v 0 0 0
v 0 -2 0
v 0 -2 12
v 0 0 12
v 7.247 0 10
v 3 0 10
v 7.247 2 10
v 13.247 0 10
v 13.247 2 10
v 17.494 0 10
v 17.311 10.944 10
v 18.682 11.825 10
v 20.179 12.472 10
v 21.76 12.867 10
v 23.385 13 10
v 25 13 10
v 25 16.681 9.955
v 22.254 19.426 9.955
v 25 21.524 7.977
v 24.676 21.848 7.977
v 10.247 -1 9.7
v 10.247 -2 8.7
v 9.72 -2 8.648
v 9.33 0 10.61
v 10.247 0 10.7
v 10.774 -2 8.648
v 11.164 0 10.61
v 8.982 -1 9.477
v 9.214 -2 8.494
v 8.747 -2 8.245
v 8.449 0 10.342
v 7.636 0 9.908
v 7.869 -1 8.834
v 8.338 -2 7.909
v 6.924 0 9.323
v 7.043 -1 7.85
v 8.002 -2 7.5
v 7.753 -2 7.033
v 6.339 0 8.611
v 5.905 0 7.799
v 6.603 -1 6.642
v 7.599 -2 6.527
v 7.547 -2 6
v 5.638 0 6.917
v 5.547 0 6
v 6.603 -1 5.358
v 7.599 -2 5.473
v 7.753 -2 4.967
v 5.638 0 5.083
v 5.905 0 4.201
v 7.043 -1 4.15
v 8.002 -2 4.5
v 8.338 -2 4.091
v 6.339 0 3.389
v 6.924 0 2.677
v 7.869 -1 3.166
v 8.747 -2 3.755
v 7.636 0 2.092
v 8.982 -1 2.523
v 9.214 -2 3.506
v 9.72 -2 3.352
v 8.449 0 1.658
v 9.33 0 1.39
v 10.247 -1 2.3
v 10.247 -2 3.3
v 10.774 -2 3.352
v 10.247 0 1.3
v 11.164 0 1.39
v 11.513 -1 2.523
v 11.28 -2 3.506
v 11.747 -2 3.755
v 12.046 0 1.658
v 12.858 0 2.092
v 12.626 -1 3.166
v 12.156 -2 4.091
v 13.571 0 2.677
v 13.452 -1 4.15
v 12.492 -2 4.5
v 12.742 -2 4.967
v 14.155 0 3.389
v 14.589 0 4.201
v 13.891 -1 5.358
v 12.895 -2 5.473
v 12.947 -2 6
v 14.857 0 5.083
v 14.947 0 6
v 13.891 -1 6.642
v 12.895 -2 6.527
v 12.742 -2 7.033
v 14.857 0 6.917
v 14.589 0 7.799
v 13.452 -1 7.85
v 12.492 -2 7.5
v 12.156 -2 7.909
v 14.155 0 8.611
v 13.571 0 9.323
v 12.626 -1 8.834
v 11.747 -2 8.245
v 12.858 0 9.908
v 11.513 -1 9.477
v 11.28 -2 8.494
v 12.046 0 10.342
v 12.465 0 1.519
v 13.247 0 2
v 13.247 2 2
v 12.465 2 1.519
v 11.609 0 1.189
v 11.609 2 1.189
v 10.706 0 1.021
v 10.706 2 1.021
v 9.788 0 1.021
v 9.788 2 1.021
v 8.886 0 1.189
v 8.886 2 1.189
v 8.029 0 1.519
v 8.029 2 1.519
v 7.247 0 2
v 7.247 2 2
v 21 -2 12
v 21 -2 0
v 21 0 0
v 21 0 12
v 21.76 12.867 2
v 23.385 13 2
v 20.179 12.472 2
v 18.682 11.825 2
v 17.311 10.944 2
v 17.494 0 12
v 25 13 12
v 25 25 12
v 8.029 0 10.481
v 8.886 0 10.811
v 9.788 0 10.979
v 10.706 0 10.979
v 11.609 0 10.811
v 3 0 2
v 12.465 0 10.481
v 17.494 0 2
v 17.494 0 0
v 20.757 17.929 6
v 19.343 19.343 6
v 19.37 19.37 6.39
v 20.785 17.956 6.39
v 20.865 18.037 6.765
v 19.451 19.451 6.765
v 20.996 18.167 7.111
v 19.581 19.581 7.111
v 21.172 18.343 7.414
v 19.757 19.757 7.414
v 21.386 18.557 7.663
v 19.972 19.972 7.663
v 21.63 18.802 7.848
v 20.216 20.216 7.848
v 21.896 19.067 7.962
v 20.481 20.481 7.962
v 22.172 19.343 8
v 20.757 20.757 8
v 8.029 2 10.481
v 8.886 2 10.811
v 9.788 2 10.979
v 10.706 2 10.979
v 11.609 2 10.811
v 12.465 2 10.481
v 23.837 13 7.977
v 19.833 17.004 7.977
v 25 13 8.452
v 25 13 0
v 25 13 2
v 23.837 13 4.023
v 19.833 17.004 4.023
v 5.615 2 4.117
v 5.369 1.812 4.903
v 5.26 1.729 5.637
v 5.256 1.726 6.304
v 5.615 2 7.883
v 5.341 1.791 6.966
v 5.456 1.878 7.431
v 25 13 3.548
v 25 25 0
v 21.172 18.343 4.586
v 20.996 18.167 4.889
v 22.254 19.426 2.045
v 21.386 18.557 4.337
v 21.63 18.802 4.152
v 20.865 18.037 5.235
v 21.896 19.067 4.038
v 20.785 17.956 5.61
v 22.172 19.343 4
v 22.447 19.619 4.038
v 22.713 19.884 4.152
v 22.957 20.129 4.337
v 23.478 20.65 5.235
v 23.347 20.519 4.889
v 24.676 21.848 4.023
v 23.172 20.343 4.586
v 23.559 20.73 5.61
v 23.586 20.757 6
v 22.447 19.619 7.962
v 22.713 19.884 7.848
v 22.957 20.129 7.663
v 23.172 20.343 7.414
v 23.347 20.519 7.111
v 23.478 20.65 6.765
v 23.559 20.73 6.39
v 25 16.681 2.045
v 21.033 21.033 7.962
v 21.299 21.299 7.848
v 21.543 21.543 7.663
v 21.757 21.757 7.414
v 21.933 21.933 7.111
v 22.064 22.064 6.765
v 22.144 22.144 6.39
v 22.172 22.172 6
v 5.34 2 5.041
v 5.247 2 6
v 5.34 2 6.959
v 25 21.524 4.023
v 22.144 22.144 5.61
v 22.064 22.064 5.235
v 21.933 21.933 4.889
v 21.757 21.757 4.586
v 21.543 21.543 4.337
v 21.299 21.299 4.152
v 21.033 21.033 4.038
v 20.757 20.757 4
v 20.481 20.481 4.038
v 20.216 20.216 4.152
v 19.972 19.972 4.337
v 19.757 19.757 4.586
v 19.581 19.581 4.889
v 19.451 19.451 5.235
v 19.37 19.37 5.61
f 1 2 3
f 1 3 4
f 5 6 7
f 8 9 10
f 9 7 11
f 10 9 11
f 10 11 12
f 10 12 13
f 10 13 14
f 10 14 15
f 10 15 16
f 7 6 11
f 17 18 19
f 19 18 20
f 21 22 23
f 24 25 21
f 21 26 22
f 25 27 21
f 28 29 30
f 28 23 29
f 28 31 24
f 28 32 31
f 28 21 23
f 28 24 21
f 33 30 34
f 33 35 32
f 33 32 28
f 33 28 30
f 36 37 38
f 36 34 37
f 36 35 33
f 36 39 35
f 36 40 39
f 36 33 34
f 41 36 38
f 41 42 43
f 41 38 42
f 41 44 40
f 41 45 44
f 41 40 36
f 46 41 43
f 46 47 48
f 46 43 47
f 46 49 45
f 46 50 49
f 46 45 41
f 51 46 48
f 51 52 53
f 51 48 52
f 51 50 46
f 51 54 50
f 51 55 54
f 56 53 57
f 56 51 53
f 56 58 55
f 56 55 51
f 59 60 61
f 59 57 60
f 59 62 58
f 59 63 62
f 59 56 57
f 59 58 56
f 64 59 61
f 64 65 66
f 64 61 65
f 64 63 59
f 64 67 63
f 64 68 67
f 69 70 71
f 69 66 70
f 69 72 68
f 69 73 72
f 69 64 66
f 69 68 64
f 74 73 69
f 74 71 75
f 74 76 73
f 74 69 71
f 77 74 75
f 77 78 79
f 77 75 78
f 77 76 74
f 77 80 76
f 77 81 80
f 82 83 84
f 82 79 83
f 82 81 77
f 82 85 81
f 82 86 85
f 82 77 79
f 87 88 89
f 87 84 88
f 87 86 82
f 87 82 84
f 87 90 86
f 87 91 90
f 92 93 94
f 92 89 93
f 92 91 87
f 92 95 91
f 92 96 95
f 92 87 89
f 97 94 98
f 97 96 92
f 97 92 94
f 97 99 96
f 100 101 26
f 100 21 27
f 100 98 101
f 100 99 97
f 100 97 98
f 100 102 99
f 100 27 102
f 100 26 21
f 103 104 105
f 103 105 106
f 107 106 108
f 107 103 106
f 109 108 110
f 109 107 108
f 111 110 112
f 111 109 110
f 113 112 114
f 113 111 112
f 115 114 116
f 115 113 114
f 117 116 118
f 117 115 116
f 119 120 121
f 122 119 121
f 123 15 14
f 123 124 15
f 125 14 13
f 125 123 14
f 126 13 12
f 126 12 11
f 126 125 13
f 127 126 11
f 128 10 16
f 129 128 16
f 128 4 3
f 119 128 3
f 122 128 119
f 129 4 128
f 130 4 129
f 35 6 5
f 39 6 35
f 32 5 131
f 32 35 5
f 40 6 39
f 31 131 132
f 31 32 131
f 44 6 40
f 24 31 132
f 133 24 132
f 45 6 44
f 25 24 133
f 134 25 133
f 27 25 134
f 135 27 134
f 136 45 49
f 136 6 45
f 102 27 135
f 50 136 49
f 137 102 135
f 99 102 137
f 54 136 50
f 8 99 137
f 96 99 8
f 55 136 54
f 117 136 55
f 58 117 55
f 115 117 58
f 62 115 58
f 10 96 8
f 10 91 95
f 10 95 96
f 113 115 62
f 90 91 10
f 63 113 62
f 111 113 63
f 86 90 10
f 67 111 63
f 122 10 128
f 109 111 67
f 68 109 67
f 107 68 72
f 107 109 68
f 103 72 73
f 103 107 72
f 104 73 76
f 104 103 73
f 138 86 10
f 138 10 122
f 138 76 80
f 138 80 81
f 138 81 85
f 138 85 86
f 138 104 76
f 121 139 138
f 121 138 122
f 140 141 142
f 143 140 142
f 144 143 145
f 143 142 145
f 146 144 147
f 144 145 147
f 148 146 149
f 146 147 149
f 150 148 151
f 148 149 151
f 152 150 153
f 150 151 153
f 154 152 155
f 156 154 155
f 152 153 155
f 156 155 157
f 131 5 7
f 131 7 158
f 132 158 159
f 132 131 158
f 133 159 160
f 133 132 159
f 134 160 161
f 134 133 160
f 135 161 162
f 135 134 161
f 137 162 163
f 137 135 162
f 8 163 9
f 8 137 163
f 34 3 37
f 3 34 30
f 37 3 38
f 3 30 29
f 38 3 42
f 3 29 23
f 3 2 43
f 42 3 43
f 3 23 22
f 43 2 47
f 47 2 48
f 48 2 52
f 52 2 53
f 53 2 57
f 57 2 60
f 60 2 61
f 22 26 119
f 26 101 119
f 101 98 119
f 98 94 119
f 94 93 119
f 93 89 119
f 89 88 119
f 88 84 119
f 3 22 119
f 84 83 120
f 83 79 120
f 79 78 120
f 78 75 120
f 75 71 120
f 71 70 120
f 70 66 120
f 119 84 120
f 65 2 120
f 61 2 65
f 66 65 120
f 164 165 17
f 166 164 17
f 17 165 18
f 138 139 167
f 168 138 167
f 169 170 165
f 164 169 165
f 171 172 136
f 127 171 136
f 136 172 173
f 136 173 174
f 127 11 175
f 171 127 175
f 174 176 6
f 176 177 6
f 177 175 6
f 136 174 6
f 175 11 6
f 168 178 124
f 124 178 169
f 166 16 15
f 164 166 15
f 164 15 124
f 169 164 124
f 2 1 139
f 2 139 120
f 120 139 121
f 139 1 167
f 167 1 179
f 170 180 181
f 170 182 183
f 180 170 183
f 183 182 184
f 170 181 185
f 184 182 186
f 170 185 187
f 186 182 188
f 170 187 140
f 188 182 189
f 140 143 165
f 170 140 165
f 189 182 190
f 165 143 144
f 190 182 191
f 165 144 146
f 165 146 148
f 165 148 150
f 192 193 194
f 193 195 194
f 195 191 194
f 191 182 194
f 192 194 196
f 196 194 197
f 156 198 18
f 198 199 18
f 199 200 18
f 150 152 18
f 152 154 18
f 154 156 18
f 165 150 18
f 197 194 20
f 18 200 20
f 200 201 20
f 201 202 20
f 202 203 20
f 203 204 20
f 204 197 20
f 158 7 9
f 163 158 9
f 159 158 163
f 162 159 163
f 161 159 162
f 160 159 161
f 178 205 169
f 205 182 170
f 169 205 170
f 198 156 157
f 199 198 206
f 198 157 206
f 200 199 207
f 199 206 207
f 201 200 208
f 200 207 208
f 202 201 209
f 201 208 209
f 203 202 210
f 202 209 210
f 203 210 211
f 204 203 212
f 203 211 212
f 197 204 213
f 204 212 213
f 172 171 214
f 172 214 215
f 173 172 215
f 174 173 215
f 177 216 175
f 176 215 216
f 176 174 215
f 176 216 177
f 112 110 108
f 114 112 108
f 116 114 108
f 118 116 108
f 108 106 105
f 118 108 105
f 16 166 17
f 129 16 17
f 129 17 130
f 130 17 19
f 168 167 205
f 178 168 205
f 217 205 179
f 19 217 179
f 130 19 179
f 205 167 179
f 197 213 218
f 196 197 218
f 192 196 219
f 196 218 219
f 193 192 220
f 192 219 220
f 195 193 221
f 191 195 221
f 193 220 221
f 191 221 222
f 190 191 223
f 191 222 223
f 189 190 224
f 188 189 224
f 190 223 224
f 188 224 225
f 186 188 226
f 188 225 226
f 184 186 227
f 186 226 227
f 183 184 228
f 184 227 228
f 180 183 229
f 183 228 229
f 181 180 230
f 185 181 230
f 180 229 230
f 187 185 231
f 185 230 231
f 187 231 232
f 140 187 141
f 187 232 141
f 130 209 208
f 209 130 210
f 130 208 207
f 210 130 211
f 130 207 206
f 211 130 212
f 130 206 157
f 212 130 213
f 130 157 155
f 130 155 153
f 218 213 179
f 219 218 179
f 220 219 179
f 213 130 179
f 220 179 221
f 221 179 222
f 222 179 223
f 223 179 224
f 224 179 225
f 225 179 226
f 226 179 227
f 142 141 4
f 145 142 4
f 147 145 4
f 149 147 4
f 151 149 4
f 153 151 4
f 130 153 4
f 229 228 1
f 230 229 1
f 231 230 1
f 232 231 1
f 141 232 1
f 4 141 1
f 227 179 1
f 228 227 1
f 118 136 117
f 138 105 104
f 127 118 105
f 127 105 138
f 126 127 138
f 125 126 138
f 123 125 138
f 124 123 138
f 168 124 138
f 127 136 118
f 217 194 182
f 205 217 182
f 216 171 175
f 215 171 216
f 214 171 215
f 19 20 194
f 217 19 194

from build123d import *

# Parameters (mm, degrees)
SKETCH3_W           = 21
SKETCH3_H           = 2
BOSS_EXTRUDE1_DEPTH = 12
CUT_EXTRUDE1_START  = -2
CUT_EXTRUDE1_DEPTH  = 8
CUT_EXTRUDE8_START  = -2
CUT_EXTRUDE8_DEPTH  = 36.336309405
CUT_EXTRUDE9_DEPTH  = 38.336309405
CUT_EXTRUDE11_DEPTH = 2
FILLET1_R           = 10


with BuildPart() as part:
    # Sketch3 → Boss-Extrude1 (new body)
    with BuildSketch(Plane.XY):
        with Locations((10.5, -1)):
            Rectangle(SKETCH3_W, SKETCH3_H)
        Polygon((13, 13), (0, 0), (17.494446501, 0), (25, 13), align=None)
        Polygon((25, 25), (13, 13), (25, 13), align=None)
    extrude(amount=BOSS_EXTRUDE1_DEPTH)

    # Sketch4 → Cut-Extrude1 (cut)
    with BuildSketch(Plane.XY.offset(12).offset(CUT_EXTRUDE1_START)):
        Polygon((25, 13), (20, 13), (3, 0), (17.494446501, 0), align=None)
    extrude(amount=-CUT_EXTRUDE1_DEPTH, mode=Mode.SUBTRACT)

    # Sketch7 → Cut-Extrude8 (cut, through all)
    with BuildSketch(Plane(origin=(0, 0, 0), x_dir=(0, 0, 1), z_dir=(-0.7071067811865485, 0.7071067811865466, 0)).offset(CUT_EXTRUDE8_START)):
        Polygon((6, 26.047596513), (6, 32.897596513), (4.022575328, 32.897596513), (2.045150656, 29.472596513), (4.022575328, 26.047596513), align=None)
        Polygon((7.977424672, 32.897596513), (6, 32.897596513), (6, 26.047596513), (7.977424672, 26.047596513), (9.954849344, 29.472596513), align=None)
    extrude(amount=-CUT_EXTRUDE8_DEPTH, mode=Mode.SUBTRACT)

    # Sketch8 → Cut-Extrude9 (cut, through all)
    with BuildSketch(Plane(origin=(0, 0, 0), x_dir=(0, 0, 1), z_dir=(-0.7071067811865485, 0.7071067811865466, 0))):
        with BuildLine():
            ThreePointArc((8, 29.355339059), (7.414213562, 30.769552622), (6, 31.355339059))
            Line((6, 31.355339059), (6, 27.355339059))
            ThreePointArc((6, 27.355339059), (7.414213562, 27.941125497), (8, 29.355339059))
        make_face()
        with BuildLine():
            Line((6, 27.355339059), (6, 31.355339059))
            ThreePointArc((6, 31.355339059), (4, 29.355339059), (6, 27.355339059))
        make_face()
    extrude(amount=-CUT_EXTRUDE9_DEPTH, mode=Mode.SUBTRACT)

    # Sketch9 → Cut-Extrude11 (cut)
    with BuildSketch(Plane(origin=(0, 0, 0), x_dir=(1, 0, 0), z_dir=(0, 1, 0))):
        with BuildLine():
            ThreePointArc((7.24722325, -2), (5.358620419, -4.950446591), (5.869726291, -8.416096101))
            Line((5.869726291, -8.416096101), (8.496224466, -6.96643844))
            ThreePointArc((8.496224466, -6.96643844), (9.28078481, -4.249001216), (11.998222034, -5.03356156))
            Line((11.998222034, -5.03356156), (14.62472021, -3.583903899))
            ThreePointArc((14.62472021, -3.583903899), (14.020027676, -2.718849781), (13.24722325, -2))
            Line((13.24722325, -2), (7.24722325, -2))
        make_face()
        with BuildLine():
            Line((8.496224466, -6.96643844), (5.869726291, -8.416096101))
            ThreePointArc((5.869726291, -8.416096101), (6.474418824, -9.281150219), (7.24722325, -10))
            Line((7.24722325, -10), (13.24722325, -10))
            ThreePointArc((13.24722325, -10), (14.719359205, -8.236067977), (15.24722325, -6))
            ThreePointArc((15.24722325, -6), (15.089097102, -4.752499458), (14.62472021, -3.583903899))
            Line((14.62472021, -3.583903899), (11.998222034, -5.03356156))
            ThreePointArc((11.998222034, -5.03356156), (12.183972791, -5.500999783), (12.24722325, -6))
            ThreePointArc((12.24722325, -6), (10.746223467, -7.936749541), (8.496224466, -6.96643844))
        make_face()
        with BuildLine():
            ThreePointArc((11.998222034, -5.03356156), (9.28078481, -4.249001216), (8.496224466, -6.96643844))
            Line((8.496224466, -6.96643844), (11.998222034, -5.03356156))
        make_face()
        with BuildLine():
            Line((11.998222034, -5.03356156), (8.496224466, -6.96643844))
            ThreePointArc((8.496224466, -6.96643844), (10.746223467, -7.936749541), (12.24722325, -6))
            ThreePointArc((12.24722325, -6), (12.183972791, -5.500999783), (11.998222034, -5.03356156))
        make_face()
        with BuildLine():
            ThreePointArc((13.24722325, -2), (10.24722325, -1), (7.24722325, -2))
            Line((7.24722325, -2), (13.24722325, -2))
        make_face()
        with BuildLine():
            Line((13.24722325, -10), (7.24722325, -10))
            ThreePointArc((7.24722325, -10), (10.24722325, -11), (13.24722325, -10))
        make_face()
    extrude(amount=CUT_EXTRUDE11_DEPTH, mode=Mode.SUBTRACT)

    # Sketch13 → CSK for M4 Flat Head Machine Screw1 (revolve, cut)
    with BuildSketch(Plane(origin=(10.24722325, 0, 6), x_dir=(0, 0, 1), z_dir=(1, 0, 0))):
        Polygon((0, 0), (0, 2), (2.15, 2), (2.15, 2.55), (4.7, 0), align=None)
    revolve(axis=Axis((10.24722325, 6.35, 6), (0, -1, 0)), mode=Mode.SUBTRACT)

    # Fillet1
    fillet1_edges = [part.edges().sort_by_distance(p)[0] for p in [
        (20, 13, 6),
    ]]
    fillet(fillet1_edges, radius=FILLET1_R)


solid = part.part
